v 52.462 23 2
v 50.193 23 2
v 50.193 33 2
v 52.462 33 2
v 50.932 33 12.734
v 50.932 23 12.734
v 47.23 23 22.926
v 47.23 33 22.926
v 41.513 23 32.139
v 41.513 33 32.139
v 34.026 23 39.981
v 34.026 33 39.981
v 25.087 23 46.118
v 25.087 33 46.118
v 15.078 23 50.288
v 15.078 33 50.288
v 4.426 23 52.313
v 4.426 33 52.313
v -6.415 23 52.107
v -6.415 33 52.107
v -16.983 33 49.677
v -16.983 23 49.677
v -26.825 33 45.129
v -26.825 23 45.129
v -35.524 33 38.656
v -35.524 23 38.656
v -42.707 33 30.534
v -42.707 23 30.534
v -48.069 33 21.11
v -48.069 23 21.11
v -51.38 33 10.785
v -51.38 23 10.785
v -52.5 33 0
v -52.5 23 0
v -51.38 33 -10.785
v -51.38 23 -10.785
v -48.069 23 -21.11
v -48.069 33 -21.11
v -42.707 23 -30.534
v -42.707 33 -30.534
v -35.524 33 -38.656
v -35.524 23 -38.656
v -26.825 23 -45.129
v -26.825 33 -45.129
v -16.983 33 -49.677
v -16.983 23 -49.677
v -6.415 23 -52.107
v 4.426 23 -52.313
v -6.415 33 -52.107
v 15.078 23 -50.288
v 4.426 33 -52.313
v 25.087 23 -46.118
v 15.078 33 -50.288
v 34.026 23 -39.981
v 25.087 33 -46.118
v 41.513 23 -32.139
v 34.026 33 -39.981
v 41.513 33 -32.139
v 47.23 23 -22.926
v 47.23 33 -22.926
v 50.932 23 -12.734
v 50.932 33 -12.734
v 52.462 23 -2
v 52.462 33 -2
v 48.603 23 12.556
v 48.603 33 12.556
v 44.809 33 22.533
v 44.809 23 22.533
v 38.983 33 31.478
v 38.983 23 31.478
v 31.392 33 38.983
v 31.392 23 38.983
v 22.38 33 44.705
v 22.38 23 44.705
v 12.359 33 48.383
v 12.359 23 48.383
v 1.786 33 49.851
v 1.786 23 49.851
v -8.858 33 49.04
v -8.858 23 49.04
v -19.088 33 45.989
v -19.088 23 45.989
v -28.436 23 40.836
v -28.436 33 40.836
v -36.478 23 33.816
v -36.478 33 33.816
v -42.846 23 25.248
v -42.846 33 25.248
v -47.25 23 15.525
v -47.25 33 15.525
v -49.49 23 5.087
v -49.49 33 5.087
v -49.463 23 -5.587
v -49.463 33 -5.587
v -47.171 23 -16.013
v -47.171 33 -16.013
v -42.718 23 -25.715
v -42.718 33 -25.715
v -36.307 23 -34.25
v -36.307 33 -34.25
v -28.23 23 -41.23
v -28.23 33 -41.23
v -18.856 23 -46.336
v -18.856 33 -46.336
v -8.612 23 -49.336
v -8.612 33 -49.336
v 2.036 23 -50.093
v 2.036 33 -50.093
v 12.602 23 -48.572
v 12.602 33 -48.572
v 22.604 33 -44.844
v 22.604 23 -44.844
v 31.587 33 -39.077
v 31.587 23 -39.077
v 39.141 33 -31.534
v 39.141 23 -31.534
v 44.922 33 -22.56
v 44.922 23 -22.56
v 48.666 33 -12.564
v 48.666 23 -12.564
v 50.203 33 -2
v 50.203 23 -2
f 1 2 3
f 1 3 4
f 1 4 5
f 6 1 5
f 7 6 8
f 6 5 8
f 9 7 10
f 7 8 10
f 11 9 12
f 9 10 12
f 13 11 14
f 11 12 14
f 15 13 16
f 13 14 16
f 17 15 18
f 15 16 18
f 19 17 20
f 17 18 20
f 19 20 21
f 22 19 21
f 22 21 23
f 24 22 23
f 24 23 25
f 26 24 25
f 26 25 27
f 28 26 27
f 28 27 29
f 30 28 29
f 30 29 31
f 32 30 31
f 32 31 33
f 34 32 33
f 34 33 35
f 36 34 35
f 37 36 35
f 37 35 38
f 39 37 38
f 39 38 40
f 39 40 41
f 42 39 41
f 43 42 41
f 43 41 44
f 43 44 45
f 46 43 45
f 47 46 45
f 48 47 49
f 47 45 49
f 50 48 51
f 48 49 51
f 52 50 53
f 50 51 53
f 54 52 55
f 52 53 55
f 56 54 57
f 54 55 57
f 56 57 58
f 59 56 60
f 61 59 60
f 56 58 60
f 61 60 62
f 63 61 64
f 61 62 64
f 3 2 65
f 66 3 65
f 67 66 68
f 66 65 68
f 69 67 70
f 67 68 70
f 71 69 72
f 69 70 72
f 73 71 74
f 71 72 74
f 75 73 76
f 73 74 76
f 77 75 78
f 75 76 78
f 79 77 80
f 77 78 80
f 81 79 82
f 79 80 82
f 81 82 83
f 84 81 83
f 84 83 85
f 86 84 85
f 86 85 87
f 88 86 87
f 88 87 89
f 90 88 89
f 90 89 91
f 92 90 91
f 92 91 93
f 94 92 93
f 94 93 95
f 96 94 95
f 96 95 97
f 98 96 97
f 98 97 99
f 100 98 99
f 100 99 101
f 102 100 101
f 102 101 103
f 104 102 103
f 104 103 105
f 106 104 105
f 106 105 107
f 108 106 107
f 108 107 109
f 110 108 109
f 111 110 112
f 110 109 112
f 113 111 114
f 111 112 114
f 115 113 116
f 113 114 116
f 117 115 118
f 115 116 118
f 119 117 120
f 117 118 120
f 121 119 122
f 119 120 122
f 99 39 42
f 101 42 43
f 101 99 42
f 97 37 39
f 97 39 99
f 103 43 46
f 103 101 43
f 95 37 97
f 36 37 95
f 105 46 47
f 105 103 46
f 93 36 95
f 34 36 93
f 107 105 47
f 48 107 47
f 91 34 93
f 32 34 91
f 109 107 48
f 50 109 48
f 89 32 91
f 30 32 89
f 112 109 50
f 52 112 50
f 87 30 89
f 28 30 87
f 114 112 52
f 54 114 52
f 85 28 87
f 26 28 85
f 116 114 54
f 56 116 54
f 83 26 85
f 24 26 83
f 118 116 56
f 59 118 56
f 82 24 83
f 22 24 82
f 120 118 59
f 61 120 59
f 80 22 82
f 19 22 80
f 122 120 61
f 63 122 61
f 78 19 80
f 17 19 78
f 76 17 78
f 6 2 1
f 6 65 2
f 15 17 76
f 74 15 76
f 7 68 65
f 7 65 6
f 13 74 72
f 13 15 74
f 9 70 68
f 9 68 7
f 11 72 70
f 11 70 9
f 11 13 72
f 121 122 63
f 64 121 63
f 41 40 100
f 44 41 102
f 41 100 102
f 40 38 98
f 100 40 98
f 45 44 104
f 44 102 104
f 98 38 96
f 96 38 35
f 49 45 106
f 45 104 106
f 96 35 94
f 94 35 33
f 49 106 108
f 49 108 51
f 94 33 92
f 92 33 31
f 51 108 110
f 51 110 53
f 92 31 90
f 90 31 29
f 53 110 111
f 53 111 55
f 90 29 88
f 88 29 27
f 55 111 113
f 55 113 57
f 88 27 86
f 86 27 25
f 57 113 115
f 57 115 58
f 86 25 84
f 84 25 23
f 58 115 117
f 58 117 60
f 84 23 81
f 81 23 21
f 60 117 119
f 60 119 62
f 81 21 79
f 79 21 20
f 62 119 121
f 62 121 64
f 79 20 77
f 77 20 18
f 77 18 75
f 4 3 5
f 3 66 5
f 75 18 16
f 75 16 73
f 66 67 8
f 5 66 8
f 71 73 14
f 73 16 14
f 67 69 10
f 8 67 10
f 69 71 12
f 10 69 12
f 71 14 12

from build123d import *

# Parameters (mm, degrees)
SKETCH035_R     = 52.5
PAD012_DEPTH    = 10
SKETCH034_R     = 50
POCKET006_DEPTH = 25
SKETCH033_W     = 65.896674
SKETCH033_H     = 4
POCKET007_DEPTH = 21


with BuildPart() as part:
    # Sketch035 → Pad012 (new body)
    with BuildSketch(Plane.XZ):
        Circle(SKETCH035_R)
    extrude(amount=PAD012_DEPTH)

    # Sketch034 (on Face3 of Pad012) → Pocket006 (cut)
    with BuildSketch(Plane.XZ.offset(10)):
        with Locations((0.237796, -0.12528)):
            Circle(SKETCH034_R)
    extrude(amount=-POCKET006_DEPTH, mode=Mode.SUBTRACT)

    # Sketch033 (on Face3 of Pocket006) → Pocket007 (cut)
    with BuildSketch(Plane.XZ.offset(10)):
        with Locations((32.948337, 0)):
            Rectangle(SKETCH033_W, SKETCH033_H)
    extrude(amount=-POCKET007_DEPTH, mode=Mode.SUBTRACT)


with BuildPart() as part_1:
    # Body010 placement: moved
    add(part.part.moved(Location((0, 33, 0))))


solid = part_1.part
